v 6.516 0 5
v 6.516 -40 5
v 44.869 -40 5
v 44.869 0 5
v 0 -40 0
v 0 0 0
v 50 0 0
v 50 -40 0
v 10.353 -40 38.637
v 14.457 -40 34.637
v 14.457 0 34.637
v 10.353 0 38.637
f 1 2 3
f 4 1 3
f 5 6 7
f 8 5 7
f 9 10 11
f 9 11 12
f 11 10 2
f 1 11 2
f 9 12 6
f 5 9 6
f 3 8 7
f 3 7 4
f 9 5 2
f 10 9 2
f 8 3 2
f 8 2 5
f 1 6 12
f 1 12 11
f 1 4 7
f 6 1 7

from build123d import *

# Parameters (mm, degrees)
F1_DEPTH = 40
F3_DEPTH = 53


with BuildPart() as f1:
    # F0 (on Front) → F1 (new body)
    with BuildSketch(Plane.XZ):
        Polygon((10.352762, 38.637033), (0, 0), (50, 0), align=None)
    extrude(amount=F1_DEPTH)

    # F2 (on face) → F3 (cut)
    with BuildSketch(Plane.XZ.offset(40)):
        Polygon((44.86927, 5), (14.457346, 34.637033), (6.516127, 5), align=None)
    extrude(amount=-F3_DEPTH, mode=Mode.SUBTRACT)


solid = f1.part
